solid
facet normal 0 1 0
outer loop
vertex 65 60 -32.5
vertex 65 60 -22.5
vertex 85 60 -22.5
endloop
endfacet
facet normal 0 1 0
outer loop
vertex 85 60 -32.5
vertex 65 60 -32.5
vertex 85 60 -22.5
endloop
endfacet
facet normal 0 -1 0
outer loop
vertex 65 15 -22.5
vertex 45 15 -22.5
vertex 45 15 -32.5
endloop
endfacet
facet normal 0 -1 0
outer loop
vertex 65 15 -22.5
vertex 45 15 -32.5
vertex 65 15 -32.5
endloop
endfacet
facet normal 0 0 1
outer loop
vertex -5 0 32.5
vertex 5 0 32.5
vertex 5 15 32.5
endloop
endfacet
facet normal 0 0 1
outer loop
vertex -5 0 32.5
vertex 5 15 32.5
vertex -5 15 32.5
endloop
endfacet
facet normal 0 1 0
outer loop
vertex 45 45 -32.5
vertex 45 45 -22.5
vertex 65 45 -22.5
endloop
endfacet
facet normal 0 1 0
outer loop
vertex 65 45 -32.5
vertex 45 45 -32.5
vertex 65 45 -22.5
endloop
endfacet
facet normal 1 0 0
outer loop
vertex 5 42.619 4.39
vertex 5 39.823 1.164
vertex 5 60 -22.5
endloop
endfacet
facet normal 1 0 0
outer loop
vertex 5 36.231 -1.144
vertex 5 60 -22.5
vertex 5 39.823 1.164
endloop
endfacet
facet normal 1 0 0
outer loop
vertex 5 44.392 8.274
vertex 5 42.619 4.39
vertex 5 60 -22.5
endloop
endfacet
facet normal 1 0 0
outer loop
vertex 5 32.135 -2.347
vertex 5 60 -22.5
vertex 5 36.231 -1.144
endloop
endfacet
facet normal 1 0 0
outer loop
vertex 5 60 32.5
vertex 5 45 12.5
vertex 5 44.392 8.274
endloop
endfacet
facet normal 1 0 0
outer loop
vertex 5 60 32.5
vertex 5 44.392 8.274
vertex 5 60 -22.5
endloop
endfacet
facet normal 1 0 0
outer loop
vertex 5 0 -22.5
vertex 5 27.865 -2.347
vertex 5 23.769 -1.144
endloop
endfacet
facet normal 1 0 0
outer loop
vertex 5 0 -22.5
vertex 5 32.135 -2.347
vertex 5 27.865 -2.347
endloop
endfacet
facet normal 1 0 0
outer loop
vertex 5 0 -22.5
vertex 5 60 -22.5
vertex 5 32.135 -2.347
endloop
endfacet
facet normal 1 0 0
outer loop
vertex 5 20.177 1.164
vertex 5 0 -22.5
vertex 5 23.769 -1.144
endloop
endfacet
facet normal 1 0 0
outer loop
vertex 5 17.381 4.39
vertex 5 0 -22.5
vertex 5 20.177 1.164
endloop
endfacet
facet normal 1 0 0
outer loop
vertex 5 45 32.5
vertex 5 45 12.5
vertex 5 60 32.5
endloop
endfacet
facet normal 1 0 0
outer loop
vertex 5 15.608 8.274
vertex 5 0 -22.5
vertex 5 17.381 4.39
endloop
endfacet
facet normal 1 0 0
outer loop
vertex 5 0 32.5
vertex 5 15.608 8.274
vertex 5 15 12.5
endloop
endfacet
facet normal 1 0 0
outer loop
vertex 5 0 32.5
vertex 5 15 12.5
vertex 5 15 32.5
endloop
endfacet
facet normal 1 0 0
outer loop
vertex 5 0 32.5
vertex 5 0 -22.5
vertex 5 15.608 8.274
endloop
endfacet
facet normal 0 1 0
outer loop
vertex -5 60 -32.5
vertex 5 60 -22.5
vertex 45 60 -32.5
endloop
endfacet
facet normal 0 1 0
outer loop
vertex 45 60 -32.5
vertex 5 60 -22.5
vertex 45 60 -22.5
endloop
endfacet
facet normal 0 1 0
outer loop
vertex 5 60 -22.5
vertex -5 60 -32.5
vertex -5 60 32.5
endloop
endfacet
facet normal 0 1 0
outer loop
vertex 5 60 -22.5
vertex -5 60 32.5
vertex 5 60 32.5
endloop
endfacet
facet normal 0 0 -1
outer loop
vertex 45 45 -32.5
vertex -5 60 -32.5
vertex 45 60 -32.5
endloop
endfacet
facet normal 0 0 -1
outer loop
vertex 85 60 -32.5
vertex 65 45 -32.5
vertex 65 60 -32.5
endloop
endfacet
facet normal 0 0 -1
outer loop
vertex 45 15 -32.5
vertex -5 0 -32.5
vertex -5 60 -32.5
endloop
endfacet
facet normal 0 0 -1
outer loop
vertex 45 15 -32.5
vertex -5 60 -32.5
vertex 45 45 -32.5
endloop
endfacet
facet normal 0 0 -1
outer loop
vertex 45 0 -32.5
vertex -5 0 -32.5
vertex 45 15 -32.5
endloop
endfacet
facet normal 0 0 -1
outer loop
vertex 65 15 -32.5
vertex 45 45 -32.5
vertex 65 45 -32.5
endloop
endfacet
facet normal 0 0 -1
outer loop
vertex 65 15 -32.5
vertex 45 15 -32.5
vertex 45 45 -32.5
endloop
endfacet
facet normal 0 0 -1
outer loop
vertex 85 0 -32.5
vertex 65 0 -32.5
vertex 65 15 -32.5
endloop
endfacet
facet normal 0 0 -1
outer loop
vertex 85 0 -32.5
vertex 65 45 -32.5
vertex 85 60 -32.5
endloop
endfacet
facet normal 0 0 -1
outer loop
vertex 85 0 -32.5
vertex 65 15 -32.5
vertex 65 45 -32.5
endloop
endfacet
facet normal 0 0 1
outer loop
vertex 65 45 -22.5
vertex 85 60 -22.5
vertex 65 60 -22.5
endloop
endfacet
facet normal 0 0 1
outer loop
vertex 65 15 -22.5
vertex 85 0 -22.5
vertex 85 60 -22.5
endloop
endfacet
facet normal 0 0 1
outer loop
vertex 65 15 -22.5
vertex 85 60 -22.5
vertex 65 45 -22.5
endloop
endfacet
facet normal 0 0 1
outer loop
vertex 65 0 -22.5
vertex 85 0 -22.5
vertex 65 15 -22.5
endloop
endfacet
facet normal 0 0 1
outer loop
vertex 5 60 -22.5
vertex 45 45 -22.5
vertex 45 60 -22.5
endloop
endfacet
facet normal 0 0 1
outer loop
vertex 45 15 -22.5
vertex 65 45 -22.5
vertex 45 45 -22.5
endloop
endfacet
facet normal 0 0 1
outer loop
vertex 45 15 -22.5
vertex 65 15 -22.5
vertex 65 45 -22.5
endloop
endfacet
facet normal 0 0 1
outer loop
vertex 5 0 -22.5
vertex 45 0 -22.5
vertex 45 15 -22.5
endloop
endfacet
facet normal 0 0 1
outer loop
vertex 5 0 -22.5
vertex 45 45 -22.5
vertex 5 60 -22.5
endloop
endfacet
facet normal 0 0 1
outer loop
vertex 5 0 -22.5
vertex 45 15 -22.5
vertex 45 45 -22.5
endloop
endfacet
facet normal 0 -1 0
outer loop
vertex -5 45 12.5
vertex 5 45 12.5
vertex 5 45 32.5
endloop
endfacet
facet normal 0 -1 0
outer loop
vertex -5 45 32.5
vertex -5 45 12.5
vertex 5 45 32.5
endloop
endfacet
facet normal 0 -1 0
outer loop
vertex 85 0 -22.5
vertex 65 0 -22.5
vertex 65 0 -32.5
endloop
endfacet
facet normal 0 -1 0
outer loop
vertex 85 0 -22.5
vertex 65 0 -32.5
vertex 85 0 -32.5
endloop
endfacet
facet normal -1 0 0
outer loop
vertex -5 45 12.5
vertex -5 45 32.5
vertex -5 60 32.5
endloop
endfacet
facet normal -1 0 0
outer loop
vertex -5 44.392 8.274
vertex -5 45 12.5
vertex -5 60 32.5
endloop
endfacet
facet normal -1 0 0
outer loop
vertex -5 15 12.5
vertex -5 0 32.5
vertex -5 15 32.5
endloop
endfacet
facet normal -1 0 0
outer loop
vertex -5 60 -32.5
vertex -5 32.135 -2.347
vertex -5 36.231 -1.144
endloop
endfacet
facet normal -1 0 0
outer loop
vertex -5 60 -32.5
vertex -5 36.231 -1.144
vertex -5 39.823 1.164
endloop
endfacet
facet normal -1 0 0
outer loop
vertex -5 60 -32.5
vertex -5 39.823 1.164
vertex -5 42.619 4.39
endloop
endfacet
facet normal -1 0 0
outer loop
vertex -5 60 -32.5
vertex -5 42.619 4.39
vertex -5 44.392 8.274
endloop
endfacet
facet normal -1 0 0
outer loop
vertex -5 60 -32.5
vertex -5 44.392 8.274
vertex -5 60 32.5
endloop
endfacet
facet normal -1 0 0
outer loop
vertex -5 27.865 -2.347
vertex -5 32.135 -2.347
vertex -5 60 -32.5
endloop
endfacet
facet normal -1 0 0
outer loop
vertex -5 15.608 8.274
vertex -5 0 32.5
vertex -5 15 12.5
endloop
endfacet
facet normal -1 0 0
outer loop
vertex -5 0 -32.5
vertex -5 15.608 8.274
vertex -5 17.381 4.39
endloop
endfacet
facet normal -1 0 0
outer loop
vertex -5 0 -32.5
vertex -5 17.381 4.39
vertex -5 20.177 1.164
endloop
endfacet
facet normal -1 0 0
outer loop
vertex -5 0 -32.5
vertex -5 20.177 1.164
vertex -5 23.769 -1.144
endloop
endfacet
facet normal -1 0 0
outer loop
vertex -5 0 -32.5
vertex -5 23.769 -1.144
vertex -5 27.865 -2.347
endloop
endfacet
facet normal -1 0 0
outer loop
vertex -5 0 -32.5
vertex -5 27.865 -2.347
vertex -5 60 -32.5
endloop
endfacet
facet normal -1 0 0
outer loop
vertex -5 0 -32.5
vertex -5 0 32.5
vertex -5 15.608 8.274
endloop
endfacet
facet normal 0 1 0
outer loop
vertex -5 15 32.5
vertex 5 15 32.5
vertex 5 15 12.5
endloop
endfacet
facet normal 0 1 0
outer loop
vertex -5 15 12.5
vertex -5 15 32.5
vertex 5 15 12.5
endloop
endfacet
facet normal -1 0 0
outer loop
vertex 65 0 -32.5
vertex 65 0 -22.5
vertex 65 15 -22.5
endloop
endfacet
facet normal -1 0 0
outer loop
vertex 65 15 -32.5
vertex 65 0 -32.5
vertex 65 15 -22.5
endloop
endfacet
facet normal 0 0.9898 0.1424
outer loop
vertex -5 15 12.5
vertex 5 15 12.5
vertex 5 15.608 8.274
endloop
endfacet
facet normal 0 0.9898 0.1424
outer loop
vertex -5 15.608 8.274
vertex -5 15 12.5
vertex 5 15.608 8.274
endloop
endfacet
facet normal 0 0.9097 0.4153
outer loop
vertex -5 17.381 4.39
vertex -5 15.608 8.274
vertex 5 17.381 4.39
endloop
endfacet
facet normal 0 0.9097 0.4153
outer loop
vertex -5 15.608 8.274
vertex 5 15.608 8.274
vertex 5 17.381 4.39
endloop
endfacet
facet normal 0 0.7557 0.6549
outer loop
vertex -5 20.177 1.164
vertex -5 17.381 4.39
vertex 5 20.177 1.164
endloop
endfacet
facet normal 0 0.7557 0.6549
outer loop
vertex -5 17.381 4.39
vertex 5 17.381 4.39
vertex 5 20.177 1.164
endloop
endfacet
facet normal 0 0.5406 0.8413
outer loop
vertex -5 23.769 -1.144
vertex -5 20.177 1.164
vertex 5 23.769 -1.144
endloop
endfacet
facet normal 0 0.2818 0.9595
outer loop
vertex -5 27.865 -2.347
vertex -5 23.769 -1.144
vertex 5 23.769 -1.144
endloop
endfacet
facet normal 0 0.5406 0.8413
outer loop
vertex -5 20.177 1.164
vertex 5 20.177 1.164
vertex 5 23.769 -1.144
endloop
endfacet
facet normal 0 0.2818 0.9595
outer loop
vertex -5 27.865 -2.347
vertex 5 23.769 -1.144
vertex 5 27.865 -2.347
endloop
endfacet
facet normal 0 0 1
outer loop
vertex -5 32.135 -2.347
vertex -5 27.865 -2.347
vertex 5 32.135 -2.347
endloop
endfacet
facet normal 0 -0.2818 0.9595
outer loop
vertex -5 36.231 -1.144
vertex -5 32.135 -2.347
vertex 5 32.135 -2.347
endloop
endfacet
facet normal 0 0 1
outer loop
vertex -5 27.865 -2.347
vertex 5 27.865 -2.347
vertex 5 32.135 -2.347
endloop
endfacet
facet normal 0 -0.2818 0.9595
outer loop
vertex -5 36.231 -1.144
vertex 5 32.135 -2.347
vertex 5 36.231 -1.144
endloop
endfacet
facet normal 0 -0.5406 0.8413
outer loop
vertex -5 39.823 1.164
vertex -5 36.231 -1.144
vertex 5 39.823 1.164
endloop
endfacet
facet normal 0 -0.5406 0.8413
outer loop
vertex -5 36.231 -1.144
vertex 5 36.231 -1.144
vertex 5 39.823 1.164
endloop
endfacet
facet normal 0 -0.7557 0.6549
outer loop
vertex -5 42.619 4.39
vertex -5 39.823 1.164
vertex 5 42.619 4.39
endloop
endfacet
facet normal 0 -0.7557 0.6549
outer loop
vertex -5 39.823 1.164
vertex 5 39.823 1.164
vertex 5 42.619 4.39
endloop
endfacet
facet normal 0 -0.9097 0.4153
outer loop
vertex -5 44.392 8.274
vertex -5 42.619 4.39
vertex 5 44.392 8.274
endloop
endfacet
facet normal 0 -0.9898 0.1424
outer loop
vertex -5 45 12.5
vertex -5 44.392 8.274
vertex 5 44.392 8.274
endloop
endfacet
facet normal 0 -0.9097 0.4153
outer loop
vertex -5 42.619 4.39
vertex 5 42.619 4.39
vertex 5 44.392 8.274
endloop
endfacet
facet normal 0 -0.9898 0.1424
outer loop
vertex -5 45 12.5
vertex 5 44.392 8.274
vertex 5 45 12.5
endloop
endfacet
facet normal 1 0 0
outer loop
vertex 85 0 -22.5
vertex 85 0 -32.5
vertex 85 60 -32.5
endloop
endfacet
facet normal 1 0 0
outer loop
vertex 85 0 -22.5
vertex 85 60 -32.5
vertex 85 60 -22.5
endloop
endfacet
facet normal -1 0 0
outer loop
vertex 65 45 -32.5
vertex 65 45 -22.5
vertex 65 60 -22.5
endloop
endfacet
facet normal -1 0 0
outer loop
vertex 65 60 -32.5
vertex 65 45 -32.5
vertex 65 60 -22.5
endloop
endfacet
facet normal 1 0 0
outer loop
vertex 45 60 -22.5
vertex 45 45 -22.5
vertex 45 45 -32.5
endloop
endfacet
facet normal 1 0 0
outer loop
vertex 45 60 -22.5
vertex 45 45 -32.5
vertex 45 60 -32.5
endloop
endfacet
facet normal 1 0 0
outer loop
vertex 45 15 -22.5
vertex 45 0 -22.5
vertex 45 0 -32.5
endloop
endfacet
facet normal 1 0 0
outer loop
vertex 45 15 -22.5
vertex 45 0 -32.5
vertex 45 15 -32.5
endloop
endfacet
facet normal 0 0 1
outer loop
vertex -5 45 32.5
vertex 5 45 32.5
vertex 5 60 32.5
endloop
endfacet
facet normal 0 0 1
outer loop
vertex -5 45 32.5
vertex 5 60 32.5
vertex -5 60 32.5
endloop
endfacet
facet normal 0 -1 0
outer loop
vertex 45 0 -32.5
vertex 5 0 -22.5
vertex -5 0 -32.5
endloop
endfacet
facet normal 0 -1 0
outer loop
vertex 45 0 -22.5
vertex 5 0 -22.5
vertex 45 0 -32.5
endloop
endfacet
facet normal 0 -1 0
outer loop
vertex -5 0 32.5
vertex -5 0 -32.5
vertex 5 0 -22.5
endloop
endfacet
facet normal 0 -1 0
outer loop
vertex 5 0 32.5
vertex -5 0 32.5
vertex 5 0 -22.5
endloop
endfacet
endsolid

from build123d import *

# Parameters (mm, degrees)
F1_DEPTH = 60
F2_W     = 20
F2_H     = 15
F3_DEPTH = 25
F5_DEPTH = 25


with BuildPart() as f1:
    # F0 (on Front) → F1 (new body)
    with BuildSketch(Plane.XZ):
        Polygon((5, -22.5), (5, 32.5), (-5, 32.5), (-5, -32.5), (5, -32.5), (85, -32.5), (85, -22.5), align=None)
    extrude(amount=-F1_DEPTH)

    # F2 (on face) → F3 (cut)
    with BuildSketch(Plane.XY.offset(-22.5)):
        with Locations((55, 7.5)):
            Rectangle(F2_W, F2_H)
        with Locations((55, 52.5)):
            Rectangle(F2_W, F2_H)
    extrude(amount=-F3_DEPTH, mode=Mode.SUBTRACT)

    # F4 (on face) → F5 (cut)
    with BuildSketch(Plane.YZ.offset(5)):
        with BuildLine():
            Line((15, 32.5), (15, 12.5))
            ThreePointArc((15, 12.5), (30, -2.5), (45, 12.5))
            Line((45, 12.5), (45, 32.5))
            Line((45, 32.5), (15, 32.5))
        make_face()
    extrude(amount=-F5_DEPTH, mode=Mode.SUBTRACT)


solid = f1.part
